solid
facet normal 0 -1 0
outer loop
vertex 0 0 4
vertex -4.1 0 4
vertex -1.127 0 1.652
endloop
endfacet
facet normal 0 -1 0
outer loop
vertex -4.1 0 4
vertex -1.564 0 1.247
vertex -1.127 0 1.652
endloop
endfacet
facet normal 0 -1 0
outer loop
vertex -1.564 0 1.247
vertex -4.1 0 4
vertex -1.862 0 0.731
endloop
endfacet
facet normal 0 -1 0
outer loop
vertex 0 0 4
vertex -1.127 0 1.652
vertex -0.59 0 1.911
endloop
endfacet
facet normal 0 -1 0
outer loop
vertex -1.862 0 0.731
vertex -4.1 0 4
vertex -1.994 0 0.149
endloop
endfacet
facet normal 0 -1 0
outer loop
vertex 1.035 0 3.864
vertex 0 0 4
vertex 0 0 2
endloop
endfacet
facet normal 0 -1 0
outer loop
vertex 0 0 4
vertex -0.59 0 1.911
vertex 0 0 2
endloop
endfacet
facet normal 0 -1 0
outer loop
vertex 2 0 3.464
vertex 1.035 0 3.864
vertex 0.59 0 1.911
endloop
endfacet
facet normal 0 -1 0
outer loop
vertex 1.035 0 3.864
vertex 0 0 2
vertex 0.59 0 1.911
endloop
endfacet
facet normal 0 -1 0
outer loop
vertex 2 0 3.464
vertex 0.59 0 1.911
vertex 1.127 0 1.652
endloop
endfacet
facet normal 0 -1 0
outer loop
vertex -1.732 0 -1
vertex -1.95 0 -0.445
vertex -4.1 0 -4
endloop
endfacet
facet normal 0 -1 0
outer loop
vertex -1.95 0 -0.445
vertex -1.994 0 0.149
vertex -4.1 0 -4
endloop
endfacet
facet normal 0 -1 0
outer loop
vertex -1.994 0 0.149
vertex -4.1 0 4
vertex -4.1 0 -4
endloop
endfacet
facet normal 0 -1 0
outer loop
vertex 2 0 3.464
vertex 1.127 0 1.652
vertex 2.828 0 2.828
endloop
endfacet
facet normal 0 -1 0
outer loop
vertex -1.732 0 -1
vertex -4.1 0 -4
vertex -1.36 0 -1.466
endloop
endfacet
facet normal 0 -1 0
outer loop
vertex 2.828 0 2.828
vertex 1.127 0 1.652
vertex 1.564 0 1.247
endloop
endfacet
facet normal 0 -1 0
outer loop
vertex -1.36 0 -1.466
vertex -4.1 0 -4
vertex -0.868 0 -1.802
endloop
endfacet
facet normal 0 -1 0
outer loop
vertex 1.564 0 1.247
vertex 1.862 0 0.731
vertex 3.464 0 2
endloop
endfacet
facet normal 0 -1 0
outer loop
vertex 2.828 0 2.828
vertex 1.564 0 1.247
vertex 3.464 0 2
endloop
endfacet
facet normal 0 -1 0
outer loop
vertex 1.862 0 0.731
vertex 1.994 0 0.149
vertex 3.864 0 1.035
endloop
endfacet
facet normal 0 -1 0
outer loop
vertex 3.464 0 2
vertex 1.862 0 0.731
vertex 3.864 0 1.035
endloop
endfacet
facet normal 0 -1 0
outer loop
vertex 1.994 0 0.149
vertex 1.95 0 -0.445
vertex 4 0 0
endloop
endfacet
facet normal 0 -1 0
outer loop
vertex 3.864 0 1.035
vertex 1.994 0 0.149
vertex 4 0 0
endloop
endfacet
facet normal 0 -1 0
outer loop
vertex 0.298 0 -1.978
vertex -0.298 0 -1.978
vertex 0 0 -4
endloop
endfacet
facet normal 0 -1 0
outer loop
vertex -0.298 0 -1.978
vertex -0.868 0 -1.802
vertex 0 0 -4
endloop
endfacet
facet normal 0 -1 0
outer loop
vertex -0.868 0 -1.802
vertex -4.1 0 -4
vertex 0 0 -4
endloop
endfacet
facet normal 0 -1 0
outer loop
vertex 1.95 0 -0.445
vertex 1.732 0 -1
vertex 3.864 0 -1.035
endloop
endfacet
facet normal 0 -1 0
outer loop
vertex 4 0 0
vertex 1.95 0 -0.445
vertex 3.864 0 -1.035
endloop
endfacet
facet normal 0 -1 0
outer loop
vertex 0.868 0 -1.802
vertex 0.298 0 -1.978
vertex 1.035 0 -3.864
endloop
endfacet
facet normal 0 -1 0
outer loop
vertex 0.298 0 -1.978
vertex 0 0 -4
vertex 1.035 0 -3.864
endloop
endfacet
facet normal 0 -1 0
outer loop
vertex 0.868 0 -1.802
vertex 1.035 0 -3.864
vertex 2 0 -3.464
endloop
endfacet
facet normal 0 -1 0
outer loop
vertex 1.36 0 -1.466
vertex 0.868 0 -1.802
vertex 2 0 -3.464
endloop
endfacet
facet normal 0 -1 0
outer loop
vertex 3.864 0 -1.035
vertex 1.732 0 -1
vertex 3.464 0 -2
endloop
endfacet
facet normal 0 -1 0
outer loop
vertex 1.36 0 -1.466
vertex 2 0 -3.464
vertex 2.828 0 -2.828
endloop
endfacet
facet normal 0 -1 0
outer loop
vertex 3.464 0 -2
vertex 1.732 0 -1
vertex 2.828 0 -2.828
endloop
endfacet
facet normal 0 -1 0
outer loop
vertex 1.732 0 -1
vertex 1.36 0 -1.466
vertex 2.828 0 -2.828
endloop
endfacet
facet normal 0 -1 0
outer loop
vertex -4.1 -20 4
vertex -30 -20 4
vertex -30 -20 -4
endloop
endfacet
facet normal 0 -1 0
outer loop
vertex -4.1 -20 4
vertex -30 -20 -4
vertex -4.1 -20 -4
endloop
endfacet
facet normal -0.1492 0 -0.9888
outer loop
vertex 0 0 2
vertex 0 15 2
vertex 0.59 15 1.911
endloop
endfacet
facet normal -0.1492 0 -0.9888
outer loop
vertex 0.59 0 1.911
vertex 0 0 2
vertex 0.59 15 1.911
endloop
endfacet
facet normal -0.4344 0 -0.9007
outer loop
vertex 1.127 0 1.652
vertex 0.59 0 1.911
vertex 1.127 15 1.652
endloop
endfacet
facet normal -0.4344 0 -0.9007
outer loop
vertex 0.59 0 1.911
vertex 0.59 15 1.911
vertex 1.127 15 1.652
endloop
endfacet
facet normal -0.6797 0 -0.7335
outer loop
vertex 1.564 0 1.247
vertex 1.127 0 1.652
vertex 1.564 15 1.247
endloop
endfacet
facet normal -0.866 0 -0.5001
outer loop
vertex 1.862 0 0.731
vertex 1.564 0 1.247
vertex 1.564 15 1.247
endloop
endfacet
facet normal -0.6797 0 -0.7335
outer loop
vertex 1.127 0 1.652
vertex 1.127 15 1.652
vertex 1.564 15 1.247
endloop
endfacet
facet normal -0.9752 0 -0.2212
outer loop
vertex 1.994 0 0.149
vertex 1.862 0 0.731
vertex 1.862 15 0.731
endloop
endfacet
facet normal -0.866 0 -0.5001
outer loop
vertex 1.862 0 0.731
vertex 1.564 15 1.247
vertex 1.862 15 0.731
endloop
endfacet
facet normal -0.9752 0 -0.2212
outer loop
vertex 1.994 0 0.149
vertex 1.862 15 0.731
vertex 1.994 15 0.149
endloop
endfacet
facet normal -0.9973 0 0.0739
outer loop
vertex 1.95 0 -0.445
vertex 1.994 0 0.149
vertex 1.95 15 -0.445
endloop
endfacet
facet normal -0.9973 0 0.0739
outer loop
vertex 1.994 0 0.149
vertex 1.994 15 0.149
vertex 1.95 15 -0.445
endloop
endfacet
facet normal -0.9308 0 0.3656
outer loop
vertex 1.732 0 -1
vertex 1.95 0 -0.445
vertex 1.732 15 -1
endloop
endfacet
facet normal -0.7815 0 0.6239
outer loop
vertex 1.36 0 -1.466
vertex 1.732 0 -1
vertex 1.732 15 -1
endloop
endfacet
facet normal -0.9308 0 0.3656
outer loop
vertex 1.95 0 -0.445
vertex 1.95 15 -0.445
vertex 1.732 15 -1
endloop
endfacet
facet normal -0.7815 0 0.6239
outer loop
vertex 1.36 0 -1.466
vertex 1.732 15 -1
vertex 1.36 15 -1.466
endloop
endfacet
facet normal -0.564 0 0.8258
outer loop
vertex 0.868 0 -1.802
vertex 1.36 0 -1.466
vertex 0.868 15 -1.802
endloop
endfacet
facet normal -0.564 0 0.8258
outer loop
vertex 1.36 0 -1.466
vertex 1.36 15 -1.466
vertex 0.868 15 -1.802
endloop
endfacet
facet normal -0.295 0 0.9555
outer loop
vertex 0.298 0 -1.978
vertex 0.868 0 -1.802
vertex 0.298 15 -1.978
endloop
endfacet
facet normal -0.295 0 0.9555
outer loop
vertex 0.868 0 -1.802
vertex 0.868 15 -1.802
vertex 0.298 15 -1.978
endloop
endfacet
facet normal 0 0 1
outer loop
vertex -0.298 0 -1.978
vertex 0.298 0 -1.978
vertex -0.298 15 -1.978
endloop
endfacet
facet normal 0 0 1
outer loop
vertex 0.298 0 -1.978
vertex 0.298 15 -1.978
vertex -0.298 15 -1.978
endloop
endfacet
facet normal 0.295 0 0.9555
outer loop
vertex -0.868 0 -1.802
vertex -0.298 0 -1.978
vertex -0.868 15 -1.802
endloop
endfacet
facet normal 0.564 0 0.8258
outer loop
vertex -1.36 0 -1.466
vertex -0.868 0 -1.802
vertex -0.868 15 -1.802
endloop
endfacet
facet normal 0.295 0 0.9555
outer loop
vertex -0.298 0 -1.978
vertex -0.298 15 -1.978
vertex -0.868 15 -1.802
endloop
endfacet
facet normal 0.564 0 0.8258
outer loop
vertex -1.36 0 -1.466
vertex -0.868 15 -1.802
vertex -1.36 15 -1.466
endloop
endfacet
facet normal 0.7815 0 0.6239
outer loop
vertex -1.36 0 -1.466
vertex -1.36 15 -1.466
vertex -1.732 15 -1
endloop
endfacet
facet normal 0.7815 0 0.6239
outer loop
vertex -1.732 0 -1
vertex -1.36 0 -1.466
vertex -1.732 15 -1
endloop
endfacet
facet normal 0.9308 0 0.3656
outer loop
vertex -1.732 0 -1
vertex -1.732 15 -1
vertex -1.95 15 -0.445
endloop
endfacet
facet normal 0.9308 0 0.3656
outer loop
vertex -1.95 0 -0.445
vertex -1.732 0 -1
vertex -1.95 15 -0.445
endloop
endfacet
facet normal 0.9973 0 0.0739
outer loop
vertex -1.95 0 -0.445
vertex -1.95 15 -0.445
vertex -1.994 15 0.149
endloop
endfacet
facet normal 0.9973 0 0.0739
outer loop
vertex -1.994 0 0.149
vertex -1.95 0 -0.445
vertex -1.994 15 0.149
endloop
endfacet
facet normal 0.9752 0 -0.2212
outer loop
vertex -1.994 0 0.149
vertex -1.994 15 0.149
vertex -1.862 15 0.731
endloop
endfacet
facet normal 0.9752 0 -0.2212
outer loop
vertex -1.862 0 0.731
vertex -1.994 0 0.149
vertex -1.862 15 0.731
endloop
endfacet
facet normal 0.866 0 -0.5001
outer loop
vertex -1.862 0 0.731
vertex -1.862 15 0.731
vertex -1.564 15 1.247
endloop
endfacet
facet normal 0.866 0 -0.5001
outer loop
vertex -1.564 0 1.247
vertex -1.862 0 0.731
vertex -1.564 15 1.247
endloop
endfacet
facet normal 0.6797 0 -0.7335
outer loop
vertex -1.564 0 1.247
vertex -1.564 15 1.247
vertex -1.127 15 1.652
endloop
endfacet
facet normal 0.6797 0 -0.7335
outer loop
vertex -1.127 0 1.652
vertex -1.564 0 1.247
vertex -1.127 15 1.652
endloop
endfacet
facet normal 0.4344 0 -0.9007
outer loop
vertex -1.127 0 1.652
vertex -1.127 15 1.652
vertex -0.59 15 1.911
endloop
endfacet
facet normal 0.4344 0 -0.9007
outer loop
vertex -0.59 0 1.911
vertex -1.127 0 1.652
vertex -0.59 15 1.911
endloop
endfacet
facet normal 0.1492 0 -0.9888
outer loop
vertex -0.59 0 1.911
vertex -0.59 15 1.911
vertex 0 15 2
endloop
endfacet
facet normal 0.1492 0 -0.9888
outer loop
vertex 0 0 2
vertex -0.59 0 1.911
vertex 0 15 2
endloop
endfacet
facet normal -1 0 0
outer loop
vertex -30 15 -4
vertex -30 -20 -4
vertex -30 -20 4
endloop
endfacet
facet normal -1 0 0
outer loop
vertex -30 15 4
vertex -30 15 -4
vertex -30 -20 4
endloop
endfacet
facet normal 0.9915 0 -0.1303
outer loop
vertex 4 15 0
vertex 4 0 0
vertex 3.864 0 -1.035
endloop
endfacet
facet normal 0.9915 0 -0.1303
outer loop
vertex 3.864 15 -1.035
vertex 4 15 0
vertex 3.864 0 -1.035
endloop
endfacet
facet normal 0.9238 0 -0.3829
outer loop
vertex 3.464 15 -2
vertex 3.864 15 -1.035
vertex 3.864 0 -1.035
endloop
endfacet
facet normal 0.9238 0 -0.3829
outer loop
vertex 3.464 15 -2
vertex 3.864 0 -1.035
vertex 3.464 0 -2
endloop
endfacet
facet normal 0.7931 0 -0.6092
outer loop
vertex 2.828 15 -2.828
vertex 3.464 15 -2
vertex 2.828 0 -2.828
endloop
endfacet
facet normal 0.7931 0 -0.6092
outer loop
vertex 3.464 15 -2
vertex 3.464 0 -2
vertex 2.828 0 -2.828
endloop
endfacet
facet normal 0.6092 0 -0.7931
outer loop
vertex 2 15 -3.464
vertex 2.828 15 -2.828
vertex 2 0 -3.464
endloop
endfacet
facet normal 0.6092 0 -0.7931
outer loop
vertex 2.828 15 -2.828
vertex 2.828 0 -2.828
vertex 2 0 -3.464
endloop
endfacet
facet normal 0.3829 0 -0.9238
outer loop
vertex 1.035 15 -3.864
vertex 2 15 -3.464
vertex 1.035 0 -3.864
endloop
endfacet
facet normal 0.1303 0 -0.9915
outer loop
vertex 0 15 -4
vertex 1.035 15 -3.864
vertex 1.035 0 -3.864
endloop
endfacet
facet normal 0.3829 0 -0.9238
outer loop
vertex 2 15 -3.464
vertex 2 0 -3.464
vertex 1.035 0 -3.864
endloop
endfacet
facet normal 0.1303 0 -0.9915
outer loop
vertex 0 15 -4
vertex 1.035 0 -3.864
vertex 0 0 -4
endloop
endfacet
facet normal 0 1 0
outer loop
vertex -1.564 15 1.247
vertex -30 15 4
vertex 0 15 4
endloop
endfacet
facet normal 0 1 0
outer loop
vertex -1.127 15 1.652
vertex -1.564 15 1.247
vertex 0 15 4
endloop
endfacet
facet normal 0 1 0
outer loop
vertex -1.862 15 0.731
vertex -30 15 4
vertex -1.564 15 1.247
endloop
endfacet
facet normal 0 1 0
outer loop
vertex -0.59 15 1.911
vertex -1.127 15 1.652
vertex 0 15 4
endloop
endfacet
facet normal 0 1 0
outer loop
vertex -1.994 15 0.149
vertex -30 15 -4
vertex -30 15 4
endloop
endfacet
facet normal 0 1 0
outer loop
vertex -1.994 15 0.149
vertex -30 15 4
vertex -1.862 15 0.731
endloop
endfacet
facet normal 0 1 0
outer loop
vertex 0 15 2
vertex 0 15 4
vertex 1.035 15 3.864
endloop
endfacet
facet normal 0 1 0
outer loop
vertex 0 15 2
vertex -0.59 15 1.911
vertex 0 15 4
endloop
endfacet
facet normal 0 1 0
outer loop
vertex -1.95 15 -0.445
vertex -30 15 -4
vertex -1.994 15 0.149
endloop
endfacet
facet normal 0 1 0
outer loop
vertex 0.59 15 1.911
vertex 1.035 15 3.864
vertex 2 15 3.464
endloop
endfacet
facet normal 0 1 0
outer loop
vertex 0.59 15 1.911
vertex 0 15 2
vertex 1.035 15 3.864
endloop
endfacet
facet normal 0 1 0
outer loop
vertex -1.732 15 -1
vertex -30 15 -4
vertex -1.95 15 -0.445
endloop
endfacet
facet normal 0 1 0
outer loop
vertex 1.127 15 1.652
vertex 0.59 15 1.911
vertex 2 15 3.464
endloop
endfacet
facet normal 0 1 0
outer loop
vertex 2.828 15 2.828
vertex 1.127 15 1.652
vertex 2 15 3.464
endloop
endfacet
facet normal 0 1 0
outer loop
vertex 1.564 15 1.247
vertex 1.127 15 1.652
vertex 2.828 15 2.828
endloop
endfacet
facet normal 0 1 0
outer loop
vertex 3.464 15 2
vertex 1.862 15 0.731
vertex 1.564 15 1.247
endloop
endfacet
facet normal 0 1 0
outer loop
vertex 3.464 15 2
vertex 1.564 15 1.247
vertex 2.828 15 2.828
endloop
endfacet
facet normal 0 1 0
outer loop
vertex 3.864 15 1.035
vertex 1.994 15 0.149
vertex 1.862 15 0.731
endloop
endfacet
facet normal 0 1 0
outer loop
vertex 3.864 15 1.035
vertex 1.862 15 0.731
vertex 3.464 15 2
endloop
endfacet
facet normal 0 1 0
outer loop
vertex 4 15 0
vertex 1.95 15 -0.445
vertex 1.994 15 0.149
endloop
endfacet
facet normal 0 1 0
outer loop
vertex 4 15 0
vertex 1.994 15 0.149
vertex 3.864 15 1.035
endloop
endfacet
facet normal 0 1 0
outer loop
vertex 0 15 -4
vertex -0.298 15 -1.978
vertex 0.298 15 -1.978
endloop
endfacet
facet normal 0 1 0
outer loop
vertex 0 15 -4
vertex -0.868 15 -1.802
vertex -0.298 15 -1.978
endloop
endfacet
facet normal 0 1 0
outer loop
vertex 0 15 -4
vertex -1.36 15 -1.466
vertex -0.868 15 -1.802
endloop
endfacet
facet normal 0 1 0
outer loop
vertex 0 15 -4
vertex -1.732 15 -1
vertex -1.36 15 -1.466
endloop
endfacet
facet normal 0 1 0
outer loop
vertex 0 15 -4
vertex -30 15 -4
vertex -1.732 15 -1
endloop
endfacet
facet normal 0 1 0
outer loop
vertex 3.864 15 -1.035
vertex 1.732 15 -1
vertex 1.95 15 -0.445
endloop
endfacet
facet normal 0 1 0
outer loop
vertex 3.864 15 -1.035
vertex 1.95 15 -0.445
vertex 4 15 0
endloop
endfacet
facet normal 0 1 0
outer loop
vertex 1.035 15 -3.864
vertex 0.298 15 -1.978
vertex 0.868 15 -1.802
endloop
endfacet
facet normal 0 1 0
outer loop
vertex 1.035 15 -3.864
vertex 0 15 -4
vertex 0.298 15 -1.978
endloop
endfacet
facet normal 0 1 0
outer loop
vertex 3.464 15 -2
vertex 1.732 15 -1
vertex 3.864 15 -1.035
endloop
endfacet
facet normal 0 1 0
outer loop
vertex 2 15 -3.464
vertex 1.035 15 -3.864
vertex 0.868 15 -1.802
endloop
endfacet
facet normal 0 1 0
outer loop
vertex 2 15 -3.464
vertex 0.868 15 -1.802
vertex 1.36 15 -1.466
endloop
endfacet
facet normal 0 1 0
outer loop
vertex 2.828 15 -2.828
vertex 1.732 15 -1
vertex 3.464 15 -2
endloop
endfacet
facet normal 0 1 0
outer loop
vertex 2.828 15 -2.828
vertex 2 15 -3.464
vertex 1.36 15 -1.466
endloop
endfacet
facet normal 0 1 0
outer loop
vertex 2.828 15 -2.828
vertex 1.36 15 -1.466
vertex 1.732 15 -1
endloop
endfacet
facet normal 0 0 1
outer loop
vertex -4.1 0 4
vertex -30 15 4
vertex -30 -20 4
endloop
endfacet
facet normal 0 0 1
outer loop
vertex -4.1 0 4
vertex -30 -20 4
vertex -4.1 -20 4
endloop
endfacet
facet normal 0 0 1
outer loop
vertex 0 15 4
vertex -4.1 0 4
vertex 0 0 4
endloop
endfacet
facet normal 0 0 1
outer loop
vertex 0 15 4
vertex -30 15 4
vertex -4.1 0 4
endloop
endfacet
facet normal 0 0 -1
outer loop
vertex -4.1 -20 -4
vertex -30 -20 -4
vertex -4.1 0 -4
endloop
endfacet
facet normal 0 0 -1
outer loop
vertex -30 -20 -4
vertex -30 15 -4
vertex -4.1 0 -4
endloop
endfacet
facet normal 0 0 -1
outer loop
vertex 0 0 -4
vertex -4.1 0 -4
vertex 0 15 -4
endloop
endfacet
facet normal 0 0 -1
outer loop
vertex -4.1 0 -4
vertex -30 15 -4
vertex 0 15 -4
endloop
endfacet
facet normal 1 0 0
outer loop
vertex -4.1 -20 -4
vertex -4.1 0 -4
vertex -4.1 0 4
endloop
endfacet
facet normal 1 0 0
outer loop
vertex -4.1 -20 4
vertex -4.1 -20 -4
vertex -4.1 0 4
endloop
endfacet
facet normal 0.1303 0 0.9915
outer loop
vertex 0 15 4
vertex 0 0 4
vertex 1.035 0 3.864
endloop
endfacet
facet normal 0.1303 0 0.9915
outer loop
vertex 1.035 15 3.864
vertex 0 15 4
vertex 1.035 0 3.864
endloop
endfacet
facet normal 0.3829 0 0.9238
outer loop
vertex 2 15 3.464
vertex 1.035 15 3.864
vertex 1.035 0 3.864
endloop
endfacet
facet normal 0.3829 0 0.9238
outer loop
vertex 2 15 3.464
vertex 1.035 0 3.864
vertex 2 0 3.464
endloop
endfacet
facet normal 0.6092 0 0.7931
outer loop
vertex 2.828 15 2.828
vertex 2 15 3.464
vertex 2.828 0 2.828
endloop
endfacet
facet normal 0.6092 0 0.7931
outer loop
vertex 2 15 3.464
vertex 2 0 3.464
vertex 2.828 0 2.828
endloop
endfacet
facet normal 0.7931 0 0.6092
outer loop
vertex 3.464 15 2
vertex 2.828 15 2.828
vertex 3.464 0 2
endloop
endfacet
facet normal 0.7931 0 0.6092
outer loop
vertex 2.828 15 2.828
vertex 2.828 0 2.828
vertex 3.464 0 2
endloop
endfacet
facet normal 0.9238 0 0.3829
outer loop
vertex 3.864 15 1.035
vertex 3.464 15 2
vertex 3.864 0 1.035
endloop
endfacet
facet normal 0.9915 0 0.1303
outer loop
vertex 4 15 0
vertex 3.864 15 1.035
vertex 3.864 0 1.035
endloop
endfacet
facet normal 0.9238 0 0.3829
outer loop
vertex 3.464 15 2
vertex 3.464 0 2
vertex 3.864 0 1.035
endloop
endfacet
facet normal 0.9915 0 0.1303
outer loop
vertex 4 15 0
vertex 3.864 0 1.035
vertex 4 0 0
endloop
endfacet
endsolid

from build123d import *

# Parameters (mm, degrees)
BOSS_EXTRUDE1_DEPTH = 15
SKETCH2_R           = 2
CUT_EXTRUDE1_DEPTH  = 34.778691508
SKETCH3_W           = 25.9
SKETCH3_H           = 8
BOSS_EXTRUDE2_DEPTH = 20


with BuildPart() as part:
    # Sketch1 → Boss-Extrude1 (new body)
    with BuildSketch(Plane(origin=(0, 0, 0), x_dir=(1, 0, 0), z_dir=(0, 1, 0))):
        with BuildLine():
            Line((-30, -4), (0, -4))
            ThreePointArc((0, -4), (-4, 0), (0, 4))
            Line((0, 4), (-30, 4))
            Line((-30, 4), (-30, -4))
        make_face()
        with BuildLine():
            ThreePointArc((0, 4), (-4, 0), (0, -4))
            Line((0, -4), (0, 4))
        make_face()
        with BuildLine():
            Line((0, 4), (0, -4))
            ThreePointArc((0, -4), (2.828427125, -2.828427125), (4, 0))
            ThreePointArc((4, 0), (2.828427125, 2.828427125), (0, 4))
        make_face()
    extrude(amount=BOSS_EXTRUDE1_DEPTH)

    # Sketch2 → Cut-Extrude1 (cut, through all)
    with BuildSketch(Plane(origin=(0, 15, 0), x_dir=(1, 0, 0), z_dir=(0, 1, 0))):
        with Locations(Location((0, 0, 0), (0, 0, 270))):
            Circle(SKETCH2_R)
    extrude(amount=-CUT_EXTRUDE1_DEPTH, mode=Mode.SUBTRACT)

    # Sketch3 → Boss-Extrude2 (add)
    with BuildSketch(Plane.XZ):
        with Locations((-17.05, 0)):
            Rectangle(SKETCH3_W, SKETCH3_H)
    extrude(amount=BOSS_EXTRUDE2_DEPTH)


solid = part.part
